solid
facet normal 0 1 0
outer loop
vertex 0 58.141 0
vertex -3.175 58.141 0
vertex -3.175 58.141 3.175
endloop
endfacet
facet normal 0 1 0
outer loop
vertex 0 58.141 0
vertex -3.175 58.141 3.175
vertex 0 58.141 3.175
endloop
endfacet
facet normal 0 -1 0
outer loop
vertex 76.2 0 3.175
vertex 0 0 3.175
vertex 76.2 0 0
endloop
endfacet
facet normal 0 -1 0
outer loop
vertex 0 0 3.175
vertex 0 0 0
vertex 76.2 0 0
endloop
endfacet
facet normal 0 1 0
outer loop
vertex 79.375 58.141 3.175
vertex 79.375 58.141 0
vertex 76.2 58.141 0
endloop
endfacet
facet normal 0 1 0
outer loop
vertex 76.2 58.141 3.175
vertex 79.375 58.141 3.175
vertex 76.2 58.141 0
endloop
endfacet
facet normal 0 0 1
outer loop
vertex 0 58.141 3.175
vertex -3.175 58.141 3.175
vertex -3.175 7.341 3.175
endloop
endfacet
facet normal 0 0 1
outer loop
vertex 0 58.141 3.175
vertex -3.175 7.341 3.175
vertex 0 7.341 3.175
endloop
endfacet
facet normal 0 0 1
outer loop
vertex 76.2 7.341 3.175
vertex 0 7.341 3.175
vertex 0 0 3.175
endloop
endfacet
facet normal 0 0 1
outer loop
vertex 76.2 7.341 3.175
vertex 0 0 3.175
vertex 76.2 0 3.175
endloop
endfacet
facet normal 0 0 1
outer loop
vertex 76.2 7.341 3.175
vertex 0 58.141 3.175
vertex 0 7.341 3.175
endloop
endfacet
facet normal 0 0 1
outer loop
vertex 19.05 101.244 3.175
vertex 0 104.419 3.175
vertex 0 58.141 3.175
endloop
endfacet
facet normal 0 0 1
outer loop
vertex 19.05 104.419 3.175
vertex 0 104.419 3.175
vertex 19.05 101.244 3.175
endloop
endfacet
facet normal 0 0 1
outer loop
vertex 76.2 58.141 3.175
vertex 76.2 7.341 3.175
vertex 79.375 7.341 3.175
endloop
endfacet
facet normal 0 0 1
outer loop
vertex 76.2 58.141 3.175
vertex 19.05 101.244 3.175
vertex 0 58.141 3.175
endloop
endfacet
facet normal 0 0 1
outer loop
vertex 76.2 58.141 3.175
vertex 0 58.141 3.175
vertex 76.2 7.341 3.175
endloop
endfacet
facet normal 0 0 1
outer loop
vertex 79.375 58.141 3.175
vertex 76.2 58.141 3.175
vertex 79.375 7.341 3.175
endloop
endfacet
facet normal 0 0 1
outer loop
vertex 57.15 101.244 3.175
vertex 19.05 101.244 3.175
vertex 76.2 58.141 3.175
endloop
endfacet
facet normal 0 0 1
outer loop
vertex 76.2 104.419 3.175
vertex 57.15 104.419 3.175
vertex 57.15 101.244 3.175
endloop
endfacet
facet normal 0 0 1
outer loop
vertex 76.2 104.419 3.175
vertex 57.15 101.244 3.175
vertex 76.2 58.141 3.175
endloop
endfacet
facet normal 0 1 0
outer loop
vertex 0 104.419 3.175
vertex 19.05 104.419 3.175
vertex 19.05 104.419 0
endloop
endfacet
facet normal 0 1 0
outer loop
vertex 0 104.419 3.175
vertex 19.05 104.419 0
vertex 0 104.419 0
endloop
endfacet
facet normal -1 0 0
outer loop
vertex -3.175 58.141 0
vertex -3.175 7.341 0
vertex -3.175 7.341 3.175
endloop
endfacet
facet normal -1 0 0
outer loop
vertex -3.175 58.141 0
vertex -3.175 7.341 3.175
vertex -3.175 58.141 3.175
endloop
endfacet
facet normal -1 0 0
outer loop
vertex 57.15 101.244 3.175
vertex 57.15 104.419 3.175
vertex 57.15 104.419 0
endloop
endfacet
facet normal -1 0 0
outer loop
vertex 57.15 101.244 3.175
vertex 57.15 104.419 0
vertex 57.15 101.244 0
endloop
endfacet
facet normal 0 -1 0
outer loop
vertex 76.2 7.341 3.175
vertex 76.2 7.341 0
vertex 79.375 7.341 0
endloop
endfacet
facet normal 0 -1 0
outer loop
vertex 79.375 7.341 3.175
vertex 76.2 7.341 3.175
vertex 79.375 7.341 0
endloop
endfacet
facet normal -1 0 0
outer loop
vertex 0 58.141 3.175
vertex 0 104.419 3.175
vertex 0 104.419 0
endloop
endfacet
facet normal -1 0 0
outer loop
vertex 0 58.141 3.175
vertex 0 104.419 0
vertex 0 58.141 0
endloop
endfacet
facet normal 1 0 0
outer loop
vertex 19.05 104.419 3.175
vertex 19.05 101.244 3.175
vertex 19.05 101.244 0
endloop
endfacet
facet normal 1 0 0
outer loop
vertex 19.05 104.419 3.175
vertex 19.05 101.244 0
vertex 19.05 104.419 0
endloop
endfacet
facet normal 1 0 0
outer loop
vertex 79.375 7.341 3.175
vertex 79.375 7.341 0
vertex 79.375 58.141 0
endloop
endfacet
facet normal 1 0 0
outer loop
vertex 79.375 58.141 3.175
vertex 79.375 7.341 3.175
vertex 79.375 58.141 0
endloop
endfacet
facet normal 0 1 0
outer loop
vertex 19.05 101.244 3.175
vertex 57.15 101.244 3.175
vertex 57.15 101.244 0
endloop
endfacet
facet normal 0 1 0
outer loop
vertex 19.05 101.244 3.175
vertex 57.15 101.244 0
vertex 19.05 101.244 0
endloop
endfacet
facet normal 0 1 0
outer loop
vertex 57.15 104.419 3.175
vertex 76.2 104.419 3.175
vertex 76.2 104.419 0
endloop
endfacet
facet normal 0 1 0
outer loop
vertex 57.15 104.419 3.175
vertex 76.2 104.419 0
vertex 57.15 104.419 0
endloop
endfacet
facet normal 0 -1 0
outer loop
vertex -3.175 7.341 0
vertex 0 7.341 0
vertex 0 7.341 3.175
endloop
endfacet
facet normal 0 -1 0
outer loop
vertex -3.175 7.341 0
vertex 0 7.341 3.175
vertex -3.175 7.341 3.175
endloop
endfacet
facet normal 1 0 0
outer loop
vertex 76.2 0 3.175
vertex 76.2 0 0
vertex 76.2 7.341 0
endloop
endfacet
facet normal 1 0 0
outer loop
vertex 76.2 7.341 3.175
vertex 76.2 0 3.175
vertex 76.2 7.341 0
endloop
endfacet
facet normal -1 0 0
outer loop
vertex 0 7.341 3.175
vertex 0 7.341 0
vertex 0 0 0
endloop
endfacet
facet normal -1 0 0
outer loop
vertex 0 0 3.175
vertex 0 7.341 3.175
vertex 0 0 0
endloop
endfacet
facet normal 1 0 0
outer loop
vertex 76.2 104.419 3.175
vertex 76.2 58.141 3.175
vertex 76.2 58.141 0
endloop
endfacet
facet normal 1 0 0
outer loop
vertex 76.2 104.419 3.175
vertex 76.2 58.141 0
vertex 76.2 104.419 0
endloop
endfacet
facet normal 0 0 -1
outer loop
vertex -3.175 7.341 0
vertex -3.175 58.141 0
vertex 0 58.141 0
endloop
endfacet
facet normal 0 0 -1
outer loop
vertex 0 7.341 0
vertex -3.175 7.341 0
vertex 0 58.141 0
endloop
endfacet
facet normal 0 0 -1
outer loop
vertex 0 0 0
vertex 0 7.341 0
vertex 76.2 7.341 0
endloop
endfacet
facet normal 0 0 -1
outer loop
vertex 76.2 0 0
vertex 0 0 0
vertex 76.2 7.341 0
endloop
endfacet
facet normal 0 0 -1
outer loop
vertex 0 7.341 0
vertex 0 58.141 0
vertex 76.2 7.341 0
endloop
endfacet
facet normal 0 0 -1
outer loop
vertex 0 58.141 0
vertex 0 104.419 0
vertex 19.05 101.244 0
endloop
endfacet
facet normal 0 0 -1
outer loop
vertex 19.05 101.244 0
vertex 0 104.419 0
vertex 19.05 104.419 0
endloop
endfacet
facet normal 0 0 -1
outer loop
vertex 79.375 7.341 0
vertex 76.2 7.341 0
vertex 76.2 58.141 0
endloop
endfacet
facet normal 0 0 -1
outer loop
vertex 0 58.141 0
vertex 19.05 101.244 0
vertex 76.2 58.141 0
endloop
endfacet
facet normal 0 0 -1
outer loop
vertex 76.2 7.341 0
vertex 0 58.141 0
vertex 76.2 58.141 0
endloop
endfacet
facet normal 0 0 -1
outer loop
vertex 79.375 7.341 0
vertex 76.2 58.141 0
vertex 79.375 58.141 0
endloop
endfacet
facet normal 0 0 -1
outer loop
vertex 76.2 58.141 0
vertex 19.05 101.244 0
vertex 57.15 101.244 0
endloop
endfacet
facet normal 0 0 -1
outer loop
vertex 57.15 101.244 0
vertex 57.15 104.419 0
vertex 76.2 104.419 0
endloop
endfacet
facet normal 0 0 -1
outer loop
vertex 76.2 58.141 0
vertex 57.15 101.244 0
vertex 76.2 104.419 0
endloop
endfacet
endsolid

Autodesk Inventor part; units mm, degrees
ref_plane "YZ Plane" through (0, 0, 0) normal (1, 0, 0) x (0, 1, 0)
ref_plane "XZ Plane" through (0, 0, 0) normal (0, 1, 0) x (-1, 0, 0)
ref_plane "XY Plane" through (0, 0, 0) normal (0, 0, 1) x (1, 0, 0)
sketch "Sketch1" plane through (0, 0, 0) normal (0, 0, 1) x (1, 0, 0)
  line L0 (0, 0) -> (76.2, 0)
  line L1 (76.2, 0) -> (76.2, 79.0194)
  line L2 (76.2, 79.0194) -> (0, 79.0194)
  line L3 (0, 79.0194) -> (0, 0)
  line L4 (0, 7.3406) -> (-3.175, 7.3406)
  line L5 (-3.175, 7.3406) -> (-3.175, 58.1406)
  line L6 (-3.175, 58.1406) -> (0, 58.1406)
  line L7 (0, 58.1406) -> (0, 7.3406)
  line L8 (38.1, 79.0194) -> (38.1, 15.1376) construction
  line L9 (76.2, 0) -> (0, 0)
  line L10 (76.2, 79.0194) -> (76.2, 0)
  line L11 (76.2, 7.3406) -> (79.375, 7.3406)
  line L12 (79.375, 7.3406) -> (79.375, 58.1406)
  line L13 (79.375, 58.1406) -> (76.2, 58.1406)
  line L14 (76.2, 58.1406) -> (76.2, 7.3406)
  dimension "d0" = 76.2
  dimension "d1" = 79.0194
  dimension "d2" = 7.3406
  dimension "d3" = 50.8
  dimension "d6" = 3.175
extrude "Extrusion1" add sketch "Sketch1" along normal blind 3.175
sketch "Sketch2" plane through (0, 0, 3.175) normal (0, 0, 1) x (1, 0, 0)
  line L0 (76.2, 79.0194) -> (0, 79.0194) projected
  line L1 (0, 79.0194) -> (76.2, 79.0194)
  line L2 (76.2, 79.0194) -> (76.2, 104.4194)
  line L3 (76.2, 104.4194) -> (0, 104.4194)
  line L4 (0, 104.4194) -> (0, 79.0194)
  point P0 (0, 0)
  dimension "d7" = 25.4
extrude "Extrusion2" add sketch "Sketch2" against normal blind 3.175
sketch "Sketch3" plane through (0, 0, 3.175) normal (0, 0, 1) x (1, 0, 0)
  line L0 (76.2, 104.4194) -> (0, 104.4194) projected
  line L1 (19.05, 104.4194) -> (57.15, 104.4194)
  line L2 (57.15, 104.4194) -> (57.15, 101.2444)
  line L3 (57.15, 101.2444) -> (19.05, 101.2444)
  line L4 (19.05, 101.2444) -> (19.05, 104.4194)
  line L5 (0, 104.4194) -> (0, 58.1406) projected
  point P0 (0, 0)
  dimension "d10" = 3.175
  dimension "d11" = 38.1
  dimension "d12" = 19.05
extrude "Extrusion3" cut sketch "Sketch3" against normal blind 3.175
properties part number "back"
